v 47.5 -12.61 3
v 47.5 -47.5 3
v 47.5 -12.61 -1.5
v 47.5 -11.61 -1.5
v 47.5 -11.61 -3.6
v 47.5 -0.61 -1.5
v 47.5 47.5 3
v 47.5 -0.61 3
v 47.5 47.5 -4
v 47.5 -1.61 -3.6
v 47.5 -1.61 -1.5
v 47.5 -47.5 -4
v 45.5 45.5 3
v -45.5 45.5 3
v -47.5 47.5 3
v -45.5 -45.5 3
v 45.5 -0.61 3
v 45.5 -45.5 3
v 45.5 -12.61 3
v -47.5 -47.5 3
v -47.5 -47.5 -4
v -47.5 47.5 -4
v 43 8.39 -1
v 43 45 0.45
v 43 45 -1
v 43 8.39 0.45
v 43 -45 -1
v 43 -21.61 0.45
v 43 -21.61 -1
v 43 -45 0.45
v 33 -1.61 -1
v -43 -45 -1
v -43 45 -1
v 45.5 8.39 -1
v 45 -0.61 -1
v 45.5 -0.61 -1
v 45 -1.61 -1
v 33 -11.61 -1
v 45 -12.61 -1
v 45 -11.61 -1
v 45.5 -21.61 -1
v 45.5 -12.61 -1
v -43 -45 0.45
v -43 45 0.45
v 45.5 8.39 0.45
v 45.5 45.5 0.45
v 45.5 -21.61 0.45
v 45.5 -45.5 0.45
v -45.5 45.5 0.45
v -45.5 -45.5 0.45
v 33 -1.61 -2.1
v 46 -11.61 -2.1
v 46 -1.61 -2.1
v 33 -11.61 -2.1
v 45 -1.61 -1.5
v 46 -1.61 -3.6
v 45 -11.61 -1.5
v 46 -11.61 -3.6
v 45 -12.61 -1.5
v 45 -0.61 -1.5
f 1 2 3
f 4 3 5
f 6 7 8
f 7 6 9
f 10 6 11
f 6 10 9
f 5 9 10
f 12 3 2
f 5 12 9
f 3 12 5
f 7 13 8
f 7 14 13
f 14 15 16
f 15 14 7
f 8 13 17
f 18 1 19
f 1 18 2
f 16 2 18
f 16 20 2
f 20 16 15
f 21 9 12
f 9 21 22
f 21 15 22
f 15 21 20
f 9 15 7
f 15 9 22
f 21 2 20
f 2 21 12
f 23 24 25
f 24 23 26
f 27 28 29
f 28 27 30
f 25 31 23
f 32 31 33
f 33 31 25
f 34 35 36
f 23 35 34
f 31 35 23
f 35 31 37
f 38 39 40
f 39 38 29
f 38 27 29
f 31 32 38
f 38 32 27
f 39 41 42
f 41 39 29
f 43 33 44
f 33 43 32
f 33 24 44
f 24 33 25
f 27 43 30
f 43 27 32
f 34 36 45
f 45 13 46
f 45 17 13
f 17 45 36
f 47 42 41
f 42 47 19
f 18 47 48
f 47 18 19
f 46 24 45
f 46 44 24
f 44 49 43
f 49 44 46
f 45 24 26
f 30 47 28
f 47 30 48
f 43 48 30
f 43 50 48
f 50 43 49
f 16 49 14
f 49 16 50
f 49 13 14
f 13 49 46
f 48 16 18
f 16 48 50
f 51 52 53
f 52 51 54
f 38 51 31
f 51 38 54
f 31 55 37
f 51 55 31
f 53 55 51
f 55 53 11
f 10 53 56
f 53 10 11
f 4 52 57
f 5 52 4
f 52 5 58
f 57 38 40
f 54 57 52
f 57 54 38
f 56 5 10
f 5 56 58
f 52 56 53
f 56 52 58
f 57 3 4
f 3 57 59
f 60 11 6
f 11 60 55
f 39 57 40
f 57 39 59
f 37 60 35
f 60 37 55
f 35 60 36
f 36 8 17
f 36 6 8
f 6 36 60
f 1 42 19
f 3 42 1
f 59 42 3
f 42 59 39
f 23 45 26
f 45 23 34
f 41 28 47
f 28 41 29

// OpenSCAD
difference(){
    difference() {
        translate([0,0,-0.5])
            cube([95,95,7],true);
        {translate([0,0,0]) 
            cube([86,90,2],true);
        translate([0,0,2]) 
            cube([91,91,3.1],true);};
    }
    {translate([40.5,-6.61,-0.5])
        cube([15,10,3.2],true);
        
     translate([47.5,-6.61,-2])
        cube([3,10,3.2],true);
        
     translate([46.5,-6.61,1])
        cube([3,12,5],true);
        
     translate([43,-6.61,0])
        cube([5,30,2],true);
    }
    
}
